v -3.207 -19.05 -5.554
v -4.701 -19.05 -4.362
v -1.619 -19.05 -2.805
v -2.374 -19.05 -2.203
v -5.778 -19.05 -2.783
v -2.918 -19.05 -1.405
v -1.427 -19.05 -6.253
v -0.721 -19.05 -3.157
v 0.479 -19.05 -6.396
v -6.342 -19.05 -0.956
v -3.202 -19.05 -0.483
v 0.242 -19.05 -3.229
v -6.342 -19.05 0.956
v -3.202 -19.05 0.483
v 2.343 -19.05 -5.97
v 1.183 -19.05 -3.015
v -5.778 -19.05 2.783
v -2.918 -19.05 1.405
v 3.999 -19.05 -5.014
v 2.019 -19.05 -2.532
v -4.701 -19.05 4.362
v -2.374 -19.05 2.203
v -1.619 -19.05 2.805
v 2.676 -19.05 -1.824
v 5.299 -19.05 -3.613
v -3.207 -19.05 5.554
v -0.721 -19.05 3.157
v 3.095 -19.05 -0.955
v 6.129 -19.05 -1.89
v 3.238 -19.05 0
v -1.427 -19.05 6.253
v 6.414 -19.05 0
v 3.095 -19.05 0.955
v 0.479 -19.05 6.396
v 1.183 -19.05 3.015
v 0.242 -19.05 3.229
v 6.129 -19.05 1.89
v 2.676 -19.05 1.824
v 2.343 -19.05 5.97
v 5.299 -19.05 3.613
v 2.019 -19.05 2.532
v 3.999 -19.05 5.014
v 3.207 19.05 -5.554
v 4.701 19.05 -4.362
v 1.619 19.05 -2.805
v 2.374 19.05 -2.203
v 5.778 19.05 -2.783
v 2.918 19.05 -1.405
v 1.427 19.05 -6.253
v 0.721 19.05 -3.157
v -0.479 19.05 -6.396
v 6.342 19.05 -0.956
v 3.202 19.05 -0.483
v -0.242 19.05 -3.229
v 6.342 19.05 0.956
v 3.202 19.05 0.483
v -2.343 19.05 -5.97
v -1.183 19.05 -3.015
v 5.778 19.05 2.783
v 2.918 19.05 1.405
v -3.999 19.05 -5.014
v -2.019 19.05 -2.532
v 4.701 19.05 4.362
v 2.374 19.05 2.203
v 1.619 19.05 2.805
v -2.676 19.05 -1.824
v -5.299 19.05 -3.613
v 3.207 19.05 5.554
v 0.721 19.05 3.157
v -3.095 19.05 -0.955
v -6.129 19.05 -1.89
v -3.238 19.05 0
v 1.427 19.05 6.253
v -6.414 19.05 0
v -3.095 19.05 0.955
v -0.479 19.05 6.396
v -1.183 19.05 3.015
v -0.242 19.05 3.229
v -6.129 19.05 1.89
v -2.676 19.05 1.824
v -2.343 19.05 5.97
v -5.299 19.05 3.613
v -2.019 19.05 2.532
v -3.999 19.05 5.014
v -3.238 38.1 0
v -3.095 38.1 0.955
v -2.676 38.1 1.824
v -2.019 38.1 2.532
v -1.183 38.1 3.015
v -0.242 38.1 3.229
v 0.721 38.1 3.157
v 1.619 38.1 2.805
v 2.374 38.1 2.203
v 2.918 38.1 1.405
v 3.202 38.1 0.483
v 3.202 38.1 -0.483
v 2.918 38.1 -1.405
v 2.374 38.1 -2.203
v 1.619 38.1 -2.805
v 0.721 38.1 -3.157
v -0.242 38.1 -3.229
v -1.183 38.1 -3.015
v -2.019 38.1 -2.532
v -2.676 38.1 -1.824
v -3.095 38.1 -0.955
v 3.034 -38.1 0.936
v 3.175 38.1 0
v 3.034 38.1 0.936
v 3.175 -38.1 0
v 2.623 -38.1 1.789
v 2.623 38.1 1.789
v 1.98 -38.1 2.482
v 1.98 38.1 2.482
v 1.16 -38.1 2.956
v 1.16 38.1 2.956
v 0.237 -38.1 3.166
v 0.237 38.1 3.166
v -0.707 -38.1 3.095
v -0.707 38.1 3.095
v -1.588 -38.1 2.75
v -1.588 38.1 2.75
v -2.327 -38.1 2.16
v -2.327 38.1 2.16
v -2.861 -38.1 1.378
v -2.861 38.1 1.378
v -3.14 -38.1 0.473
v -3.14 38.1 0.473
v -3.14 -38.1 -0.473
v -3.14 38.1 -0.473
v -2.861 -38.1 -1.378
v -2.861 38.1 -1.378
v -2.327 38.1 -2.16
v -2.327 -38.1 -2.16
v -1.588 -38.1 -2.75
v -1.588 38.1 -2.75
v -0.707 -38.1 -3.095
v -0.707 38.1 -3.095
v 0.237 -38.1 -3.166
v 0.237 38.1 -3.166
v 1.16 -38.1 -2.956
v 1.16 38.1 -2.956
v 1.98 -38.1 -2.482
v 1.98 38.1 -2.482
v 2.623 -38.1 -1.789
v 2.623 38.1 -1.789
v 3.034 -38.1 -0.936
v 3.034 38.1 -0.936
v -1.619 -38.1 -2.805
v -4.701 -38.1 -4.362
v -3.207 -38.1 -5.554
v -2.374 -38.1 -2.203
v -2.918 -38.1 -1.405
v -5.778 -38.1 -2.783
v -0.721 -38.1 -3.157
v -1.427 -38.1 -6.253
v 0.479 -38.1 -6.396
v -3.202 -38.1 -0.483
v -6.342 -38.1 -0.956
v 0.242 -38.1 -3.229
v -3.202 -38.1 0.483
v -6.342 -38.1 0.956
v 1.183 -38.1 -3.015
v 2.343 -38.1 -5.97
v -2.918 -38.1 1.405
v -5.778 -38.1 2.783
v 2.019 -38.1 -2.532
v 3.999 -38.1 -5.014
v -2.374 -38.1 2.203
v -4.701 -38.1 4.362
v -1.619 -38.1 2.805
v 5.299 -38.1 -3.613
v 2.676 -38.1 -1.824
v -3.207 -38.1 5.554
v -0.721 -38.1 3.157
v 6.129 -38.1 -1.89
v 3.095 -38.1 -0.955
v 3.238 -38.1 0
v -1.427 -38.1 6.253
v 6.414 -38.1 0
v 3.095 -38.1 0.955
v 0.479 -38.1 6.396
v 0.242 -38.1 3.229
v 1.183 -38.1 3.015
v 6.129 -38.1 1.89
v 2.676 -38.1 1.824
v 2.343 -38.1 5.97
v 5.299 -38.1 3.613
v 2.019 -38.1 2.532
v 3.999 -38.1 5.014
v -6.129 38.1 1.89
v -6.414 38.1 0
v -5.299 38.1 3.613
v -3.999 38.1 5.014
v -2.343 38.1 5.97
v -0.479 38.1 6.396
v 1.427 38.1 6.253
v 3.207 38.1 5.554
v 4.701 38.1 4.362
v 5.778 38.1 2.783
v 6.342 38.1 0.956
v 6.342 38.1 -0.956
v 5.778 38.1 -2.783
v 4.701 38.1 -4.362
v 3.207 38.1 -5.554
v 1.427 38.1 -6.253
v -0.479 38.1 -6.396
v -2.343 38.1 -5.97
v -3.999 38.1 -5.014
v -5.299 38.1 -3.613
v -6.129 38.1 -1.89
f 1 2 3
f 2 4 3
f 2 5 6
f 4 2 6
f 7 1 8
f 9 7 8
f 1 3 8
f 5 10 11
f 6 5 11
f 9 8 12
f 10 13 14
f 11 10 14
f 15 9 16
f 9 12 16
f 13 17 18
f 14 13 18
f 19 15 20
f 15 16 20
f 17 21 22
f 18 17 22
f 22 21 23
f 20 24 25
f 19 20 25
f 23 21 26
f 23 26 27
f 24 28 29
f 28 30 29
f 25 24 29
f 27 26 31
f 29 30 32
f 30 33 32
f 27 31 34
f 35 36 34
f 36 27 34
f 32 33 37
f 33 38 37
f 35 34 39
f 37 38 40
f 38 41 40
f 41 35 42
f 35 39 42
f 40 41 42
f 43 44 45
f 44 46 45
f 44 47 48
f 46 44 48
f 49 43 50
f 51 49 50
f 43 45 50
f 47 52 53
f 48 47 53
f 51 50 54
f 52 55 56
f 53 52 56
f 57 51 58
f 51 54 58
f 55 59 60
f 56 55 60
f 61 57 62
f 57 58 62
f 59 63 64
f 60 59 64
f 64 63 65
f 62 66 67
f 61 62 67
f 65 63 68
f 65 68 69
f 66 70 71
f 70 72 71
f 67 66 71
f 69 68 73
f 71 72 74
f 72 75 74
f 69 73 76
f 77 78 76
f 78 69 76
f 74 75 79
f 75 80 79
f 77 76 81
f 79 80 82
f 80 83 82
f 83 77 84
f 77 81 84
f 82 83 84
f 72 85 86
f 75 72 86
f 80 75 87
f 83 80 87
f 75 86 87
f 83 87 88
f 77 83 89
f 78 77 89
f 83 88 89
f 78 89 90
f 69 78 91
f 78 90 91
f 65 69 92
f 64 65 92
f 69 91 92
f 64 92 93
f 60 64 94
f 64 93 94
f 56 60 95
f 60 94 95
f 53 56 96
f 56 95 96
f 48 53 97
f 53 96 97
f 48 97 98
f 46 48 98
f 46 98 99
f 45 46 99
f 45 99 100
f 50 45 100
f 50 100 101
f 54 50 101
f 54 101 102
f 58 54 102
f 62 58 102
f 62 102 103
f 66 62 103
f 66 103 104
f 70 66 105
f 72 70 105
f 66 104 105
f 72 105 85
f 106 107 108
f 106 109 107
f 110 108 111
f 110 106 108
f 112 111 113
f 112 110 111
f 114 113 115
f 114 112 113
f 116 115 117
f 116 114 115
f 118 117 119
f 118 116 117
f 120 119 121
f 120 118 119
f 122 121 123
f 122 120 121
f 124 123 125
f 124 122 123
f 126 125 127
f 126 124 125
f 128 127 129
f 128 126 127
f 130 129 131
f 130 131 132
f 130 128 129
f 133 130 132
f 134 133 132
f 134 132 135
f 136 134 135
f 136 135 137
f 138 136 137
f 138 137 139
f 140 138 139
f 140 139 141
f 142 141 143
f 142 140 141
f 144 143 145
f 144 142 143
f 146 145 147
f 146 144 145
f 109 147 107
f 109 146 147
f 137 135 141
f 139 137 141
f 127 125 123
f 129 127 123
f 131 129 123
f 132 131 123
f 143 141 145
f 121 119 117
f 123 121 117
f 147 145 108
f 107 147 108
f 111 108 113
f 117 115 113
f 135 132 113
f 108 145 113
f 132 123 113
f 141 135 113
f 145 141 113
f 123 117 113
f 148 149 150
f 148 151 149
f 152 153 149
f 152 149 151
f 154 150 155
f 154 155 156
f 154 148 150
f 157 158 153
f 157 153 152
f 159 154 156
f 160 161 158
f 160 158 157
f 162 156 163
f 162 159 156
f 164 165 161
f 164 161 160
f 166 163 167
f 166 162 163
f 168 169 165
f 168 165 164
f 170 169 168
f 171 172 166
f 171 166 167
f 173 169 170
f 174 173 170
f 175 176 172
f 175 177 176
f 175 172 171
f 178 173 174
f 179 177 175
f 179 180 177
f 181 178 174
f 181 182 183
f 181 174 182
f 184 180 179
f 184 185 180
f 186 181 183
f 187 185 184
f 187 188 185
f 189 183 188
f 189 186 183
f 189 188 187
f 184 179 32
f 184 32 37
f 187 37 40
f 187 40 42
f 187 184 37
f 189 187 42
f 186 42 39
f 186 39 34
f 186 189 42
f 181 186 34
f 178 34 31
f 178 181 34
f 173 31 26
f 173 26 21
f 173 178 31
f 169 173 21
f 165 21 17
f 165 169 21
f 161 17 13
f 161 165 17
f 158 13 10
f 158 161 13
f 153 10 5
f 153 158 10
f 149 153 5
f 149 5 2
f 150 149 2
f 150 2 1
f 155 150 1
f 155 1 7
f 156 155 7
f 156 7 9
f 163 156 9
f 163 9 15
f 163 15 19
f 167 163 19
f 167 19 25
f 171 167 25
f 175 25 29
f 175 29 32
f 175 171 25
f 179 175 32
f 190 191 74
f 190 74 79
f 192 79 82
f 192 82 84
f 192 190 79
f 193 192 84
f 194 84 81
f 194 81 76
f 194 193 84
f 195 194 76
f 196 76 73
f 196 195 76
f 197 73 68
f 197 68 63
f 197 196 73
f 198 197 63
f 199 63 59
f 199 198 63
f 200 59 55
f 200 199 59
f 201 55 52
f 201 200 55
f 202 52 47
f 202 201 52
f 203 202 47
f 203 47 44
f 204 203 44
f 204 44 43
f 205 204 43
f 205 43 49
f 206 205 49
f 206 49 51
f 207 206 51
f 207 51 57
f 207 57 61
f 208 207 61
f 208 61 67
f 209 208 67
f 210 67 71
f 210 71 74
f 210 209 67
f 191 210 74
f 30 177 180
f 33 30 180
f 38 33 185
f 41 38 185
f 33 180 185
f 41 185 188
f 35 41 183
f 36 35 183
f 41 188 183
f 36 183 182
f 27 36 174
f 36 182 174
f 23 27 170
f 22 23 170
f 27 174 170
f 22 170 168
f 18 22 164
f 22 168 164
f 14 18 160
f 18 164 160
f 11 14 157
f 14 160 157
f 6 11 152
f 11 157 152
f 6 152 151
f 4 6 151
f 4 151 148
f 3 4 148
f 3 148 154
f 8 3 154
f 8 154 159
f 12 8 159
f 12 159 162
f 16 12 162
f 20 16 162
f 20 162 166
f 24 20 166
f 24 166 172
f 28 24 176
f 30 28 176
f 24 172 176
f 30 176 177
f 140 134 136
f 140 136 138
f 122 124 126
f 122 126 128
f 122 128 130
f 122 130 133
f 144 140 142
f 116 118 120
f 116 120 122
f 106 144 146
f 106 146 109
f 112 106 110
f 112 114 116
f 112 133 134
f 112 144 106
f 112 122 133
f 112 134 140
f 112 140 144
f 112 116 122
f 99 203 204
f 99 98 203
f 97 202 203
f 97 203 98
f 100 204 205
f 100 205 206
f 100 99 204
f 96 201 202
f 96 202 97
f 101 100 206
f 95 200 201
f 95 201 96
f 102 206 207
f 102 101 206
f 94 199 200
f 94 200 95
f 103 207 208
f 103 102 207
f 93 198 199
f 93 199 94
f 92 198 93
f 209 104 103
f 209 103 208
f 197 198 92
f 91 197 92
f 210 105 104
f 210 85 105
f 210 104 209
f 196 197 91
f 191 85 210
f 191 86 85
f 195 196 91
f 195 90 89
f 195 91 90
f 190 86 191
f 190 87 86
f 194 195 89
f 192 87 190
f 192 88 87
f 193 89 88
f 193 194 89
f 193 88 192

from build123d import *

# Parameters (mm, degrees)
F0_R     = 3.175
F1_DEPTH = 38.1
F2_R     = 6.4135
F2_R_2   = 3.2385
F3_DEPTH = 19.05
F4_R     = 6.4135
F4_R_2   = 3.2385
F5_DEPTH = 19.05


with BuildPart() as f1:
    # F0 (on Front) → F1 (new body, symmetric)
    with BuildSketch(Plane.XZ):
        Circle(F0_R)
    extrude(amount=F1_DEPTH, both=True)


with BuildPart() as f3:
    # F2 (on face) → F3 (new body)
    with BuildSketch(Plane.XZ.offset(38.1)):
        Circle(F2_R)
        Circle(F2_R_2, mode=Mode.SUBTRACT)
    extrude(amount=-F3_DEPTH)


with BuildPart() as f5:
    # F4 (on face) → F5 (new body)
    with BuildSketch(Plane(origin=(0, 38.1, 0), x_dir=(-1, 0, 0), z_dir=(0, 1, 0))):
        Circle(F4_R)
        Circle(F4_R_2, mode=Mode.SUBTRACT)
    extrude(amount=-F5_DEPTH)


solid = Compound([f1.part, f3.part, f5.part])
